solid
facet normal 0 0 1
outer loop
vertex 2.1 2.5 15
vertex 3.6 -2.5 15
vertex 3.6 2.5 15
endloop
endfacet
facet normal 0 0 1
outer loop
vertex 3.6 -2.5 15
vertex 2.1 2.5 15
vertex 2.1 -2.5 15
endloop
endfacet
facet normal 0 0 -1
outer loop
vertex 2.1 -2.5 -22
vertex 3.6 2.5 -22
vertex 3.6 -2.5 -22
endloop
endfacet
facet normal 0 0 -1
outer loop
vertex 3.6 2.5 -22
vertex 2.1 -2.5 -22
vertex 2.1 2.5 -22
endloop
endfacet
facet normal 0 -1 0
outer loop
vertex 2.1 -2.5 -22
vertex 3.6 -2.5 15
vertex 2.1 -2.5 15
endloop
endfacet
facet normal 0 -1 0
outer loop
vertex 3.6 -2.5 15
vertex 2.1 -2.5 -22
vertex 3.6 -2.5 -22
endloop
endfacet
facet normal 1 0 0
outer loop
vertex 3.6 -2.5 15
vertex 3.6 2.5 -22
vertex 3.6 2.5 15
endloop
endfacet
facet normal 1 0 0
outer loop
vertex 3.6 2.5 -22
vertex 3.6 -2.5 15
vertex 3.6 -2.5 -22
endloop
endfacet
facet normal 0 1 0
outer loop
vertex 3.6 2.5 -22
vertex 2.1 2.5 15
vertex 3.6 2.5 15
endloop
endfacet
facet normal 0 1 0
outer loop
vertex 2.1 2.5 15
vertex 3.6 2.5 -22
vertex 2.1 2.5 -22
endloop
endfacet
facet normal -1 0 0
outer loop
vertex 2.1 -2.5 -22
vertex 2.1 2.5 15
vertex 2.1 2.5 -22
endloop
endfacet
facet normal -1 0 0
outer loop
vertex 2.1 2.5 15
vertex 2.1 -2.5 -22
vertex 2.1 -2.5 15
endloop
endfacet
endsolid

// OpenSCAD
//globals
$fn=50;
obj_round = 50;
twist_ratio = 1.62; // based on obj_height = 50 / twist=81
obj_height = 44;
twist=obj_height * twist_ratio;
shaft = 5.2;

module master(){
	module rightGear(twist) {
		rotate([0, 0, -25]) {
			translate([0, 0, obj_height/4])
			linear_extrude(height = obj_height/2, center = true, twist = twist, convexity = 10)
			    import (file = "small_gear.dxf", layer = "Layer_1");
			circle(r = 1);
		}
	}

    module gearObject() {

        module gear() {

            union() {
                rightGear(twist);
                mirror([0,0,1]) rightGear(twist);
            }

        }

        module hole() {
            cylinder(d=shaft, h=obj_height*2.1, center=true);
        }

        module bolt_hole() {
            translate([0, 0, obj_height/2-10]) rotate([0,90,0]) cylinder(d=2.5, h=10);
        }

        module bone() {
            difference() {
                gear(twist=twist);
                hole();
                #bolt_hole();
            }
        }
        union() {
            translate([5.6/2 - 0.7, -2.5, -obj_height/2]) cube([1.5,5,obj_height-7], center=false);
            bone();
        }
    }
gearObject();
}

intersection(){
    master();
}
